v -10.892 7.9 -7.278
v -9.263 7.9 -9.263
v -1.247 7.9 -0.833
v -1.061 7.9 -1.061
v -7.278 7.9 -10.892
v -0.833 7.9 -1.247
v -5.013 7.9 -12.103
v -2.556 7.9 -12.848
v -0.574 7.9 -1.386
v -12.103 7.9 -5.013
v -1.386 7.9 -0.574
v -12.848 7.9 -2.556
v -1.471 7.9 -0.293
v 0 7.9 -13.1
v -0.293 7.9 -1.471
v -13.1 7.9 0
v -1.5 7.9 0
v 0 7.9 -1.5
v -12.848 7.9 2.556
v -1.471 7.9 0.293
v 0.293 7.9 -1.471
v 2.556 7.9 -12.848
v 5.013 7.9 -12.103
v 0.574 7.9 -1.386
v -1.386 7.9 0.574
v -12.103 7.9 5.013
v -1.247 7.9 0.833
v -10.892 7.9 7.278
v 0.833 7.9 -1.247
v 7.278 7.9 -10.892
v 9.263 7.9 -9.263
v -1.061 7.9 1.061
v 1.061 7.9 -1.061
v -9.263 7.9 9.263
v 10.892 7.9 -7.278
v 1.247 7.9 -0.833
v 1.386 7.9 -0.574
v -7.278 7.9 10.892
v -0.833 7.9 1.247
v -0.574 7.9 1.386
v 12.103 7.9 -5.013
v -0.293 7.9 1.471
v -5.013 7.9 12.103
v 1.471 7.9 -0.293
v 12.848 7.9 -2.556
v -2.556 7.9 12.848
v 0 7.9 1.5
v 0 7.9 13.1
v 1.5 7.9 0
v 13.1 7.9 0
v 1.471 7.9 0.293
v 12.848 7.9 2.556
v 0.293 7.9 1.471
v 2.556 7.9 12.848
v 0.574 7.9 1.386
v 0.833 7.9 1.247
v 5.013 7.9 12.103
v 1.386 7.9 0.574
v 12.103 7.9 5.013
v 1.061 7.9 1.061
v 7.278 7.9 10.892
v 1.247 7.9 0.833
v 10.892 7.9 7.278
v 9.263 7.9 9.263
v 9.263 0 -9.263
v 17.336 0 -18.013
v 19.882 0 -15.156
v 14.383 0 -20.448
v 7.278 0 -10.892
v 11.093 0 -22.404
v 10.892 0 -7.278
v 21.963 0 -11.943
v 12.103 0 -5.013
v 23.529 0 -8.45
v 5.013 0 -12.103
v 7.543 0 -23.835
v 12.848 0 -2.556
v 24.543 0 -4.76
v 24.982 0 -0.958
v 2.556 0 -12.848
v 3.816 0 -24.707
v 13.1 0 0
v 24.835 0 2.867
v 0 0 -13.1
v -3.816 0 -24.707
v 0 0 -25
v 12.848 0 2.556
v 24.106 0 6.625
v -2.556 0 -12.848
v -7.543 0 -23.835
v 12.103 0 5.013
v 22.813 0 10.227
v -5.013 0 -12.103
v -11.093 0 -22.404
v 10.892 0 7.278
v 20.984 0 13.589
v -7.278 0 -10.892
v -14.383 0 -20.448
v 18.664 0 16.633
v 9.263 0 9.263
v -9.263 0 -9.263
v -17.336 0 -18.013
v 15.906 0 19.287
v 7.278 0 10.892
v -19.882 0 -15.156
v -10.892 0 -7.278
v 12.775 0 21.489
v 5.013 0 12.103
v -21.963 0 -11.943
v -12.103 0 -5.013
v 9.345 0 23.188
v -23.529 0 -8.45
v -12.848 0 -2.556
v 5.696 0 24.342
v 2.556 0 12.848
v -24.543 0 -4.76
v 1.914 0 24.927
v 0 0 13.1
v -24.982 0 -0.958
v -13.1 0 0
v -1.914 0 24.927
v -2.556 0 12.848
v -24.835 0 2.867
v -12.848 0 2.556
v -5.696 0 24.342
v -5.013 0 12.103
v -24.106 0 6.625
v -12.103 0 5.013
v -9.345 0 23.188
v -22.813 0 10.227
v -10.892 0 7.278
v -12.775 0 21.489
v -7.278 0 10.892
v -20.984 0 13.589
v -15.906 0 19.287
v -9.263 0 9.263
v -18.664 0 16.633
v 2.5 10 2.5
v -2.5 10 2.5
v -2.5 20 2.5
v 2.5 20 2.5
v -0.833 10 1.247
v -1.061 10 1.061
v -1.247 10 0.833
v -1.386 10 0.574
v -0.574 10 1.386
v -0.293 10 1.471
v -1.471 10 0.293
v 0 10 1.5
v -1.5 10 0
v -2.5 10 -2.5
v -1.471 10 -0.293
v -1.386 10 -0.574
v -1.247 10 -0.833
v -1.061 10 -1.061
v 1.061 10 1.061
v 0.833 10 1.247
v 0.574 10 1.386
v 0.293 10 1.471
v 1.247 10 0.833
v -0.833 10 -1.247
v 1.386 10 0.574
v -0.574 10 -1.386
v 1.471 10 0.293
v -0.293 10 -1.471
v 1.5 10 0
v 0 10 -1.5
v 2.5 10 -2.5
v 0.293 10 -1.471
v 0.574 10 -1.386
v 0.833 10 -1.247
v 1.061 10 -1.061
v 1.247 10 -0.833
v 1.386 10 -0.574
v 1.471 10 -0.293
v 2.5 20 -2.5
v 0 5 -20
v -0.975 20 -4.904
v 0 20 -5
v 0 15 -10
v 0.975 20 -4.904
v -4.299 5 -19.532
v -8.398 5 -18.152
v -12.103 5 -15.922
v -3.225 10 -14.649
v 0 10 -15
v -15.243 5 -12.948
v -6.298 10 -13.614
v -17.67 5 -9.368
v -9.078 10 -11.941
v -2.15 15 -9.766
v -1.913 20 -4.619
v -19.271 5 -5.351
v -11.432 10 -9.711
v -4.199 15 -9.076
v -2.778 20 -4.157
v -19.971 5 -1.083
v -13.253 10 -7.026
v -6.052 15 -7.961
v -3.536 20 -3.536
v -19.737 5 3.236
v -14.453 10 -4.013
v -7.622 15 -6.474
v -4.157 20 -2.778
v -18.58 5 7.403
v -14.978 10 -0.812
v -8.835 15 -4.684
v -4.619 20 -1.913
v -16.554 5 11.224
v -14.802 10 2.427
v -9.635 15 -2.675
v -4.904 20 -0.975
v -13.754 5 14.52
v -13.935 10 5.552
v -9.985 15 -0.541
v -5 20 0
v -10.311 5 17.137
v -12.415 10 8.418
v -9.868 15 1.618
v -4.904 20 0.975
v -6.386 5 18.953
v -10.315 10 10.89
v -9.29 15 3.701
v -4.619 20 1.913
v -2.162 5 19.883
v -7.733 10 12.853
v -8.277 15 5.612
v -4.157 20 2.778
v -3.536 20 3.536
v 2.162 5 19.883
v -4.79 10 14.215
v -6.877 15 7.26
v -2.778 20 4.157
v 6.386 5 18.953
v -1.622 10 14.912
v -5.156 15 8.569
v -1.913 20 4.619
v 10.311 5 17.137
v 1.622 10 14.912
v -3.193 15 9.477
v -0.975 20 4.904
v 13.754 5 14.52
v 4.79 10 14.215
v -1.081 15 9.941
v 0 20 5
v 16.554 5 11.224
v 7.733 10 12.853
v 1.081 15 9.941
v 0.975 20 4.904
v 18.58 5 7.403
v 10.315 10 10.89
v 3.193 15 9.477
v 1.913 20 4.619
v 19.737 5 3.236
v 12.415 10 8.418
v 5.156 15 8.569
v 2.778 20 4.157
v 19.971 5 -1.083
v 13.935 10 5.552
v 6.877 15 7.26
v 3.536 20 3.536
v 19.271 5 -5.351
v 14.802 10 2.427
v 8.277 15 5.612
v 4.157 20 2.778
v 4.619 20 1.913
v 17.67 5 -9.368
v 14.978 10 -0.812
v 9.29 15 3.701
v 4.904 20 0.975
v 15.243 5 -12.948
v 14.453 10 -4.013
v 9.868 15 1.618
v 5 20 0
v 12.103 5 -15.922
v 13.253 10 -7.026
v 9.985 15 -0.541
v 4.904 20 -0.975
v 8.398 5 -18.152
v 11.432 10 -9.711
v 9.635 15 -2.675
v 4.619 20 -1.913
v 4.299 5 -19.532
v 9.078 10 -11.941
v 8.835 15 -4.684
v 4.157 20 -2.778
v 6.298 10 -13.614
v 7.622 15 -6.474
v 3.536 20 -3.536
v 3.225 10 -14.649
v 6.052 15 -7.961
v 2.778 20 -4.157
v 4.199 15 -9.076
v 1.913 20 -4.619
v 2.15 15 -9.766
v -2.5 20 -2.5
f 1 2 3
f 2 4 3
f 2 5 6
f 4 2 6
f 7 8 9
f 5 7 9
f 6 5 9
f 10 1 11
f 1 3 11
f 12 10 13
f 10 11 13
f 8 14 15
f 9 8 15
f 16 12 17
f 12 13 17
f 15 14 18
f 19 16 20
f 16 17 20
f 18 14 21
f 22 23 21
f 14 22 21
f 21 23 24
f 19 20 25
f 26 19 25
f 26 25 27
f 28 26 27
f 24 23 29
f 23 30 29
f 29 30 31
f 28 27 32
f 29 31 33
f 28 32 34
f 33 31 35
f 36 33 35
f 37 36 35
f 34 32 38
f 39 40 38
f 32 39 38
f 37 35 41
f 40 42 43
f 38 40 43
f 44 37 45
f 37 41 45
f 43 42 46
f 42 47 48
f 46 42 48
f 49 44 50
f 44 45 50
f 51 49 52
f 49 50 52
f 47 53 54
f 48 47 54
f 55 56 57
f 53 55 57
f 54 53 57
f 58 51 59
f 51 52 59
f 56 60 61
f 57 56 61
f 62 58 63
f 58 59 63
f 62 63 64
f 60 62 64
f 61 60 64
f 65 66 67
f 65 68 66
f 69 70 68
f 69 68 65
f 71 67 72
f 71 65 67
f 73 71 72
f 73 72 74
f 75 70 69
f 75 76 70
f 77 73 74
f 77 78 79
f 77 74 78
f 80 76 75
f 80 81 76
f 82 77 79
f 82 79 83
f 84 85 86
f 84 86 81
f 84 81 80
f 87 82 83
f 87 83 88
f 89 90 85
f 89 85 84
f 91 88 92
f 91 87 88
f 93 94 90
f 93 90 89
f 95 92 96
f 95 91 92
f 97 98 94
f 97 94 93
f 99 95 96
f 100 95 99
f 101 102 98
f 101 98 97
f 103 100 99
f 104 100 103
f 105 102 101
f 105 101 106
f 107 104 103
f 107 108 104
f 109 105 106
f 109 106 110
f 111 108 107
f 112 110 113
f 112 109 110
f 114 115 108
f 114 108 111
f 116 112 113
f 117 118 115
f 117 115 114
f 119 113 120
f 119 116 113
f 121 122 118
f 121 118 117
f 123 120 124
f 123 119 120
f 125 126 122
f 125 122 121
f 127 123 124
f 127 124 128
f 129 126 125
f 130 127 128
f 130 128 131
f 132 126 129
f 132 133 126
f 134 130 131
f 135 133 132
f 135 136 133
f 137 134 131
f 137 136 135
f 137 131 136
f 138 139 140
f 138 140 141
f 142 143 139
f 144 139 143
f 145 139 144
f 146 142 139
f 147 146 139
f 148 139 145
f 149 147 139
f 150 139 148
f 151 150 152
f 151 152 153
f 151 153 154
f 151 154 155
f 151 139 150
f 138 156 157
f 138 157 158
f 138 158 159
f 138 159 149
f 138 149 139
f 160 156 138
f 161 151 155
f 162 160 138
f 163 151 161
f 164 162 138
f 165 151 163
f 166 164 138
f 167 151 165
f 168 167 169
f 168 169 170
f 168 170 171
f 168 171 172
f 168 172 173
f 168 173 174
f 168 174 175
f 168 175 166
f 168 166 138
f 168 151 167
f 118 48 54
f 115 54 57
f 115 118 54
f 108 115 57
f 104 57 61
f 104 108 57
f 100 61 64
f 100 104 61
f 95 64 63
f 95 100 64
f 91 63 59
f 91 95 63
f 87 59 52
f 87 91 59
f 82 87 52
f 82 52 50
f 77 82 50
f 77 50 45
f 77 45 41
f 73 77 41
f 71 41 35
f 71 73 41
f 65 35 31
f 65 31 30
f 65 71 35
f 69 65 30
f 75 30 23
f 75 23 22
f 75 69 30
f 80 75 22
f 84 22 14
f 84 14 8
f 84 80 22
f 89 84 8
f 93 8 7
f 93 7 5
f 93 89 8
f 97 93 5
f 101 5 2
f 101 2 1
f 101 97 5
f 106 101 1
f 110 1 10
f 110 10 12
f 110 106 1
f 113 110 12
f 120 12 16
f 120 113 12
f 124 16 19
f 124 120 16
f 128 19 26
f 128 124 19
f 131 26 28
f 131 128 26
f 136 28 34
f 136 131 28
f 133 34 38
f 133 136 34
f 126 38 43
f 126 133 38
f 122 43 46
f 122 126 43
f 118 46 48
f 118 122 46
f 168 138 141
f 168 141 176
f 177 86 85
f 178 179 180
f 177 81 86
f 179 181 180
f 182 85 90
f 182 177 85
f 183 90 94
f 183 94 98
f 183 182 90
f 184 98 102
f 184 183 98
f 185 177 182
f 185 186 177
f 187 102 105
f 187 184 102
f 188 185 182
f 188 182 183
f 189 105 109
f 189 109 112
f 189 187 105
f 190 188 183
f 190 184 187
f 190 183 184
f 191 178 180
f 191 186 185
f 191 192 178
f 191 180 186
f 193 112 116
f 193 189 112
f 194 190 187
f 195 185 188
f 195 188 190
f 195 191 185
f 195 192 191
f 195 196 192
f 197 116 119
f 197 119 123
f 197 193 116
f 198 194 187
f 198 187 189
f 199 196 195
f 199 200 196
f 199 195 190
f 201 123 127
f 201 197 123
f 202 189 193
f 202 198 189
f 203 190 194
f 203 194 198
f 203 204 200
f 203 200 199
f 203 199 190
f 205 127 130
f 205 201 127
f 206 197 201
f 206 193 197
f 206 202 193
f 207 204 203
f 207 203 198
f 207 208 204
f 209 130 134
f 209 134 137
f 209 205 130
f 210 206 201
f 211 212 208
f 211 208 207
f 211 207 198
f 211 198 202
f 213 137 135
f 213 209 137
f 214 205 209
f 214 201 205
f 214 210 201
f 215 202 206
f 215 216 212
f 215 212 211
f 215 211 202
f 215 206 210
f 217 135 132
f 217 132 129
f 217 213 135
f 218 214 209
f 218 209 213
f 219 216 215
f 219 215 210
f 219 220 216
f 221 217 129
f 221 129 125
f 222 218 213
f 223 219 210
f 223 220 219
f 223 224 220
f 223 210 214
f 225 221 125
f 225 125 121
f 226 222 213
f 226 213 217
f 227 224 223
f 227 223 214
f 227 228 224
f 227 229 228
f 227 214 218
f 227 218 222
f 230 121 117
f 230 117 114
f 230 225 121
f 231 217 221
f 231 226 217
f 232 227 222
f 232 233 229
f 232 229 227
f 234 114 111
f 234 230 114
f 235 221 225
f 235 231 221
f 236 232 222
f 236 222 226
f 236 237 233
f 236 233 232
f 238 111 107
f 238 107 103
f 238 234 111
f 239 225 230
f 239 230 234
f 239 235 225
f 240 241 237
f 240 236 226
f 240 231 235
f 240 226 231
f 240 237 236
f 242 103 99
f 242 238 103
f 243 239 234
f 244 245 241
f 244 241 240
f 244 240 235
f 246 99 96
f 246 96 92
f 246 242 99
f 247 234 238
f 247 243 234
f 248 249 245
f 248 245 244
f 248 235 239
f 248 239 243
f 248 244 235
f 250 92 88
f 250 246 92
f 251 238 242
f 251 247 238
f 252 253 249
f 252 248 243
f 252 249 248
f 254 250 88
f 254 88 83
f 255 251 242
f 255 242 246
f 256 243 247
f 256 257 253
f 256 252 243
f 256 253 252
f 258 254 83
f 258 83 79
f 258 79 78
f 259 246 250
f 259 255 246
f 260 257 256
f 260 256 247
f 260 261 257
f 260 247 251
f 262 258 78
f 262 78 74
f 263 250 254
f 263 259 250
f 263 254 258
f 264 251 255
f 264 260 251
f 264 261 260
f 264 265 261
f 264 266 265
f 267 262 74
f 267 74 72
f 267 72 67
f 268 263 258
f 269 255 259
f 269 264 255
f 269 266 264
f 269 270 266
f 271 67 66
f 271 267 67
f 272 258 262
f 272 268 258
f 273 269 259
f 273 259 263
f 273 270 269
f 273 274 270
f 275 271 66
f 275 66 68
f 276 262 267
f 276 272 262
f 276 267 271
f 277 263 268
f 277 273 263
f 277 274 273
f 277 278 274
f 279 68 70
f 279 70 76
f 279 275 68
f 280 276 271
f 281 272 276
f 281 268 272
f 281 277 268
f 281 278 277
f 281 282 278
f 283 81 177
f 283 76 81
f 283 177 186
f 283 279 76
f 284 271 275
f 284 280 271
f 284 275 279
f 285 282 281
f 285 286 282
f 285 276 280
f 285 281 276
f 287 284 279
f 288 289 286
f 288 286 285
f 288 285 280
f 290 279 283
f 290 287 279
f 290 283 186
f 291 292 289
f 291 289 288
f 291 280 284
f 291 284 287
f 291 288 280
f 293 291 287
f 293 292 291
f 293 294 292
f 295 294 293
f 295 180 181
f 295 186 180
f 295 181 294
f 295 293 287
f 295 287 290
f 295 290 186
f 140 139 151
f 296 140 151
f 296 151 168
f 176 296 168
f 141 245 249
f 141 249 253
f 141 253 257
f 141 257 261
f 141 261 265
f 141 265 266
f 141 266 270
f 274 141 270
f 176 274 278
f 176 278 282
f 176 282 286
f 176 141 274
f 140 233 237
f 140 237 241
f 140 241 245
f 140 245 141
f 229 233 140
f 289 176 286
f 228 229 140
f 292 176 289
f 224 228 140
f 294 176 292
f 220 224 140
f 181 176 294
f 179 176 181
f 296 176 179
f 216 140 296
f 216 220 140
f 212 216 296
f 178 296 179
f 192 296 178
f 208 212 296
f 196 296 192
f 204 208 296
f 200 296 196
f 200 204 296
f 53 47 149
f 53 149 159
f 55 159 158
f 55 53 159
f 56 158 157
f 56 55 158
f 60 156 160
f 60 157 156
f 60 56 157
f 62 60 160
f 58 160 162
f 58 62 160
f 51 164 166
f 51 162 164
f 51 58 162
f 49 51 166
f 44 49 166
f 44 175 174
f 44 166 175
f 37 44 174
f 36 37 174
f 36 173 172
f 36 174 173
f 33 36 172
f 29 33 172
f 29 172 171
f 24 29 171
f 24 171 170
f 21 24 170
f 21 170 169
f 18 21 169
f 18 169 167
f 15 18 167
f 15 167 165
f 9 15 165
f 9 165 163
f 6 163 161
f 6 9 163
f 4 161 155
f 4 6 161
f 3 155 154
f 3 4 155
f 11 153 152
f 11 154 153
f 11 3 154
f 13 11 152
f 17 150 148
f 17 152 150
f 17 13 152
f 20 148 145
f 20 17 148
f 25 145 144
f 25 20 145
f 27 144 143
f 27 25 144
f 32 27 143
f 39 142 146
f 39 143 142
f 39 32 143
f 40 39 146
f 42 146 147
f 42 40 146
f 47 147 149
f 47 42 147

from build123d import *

# Parameters (mm, degrees)
SKETCH2_R          = 1.5
CUT_EXTRUDE1_DEPTH = 41.620192023
CUT_EXTRUDE2_START = 10
SKETCH3_W          = 5
SKETCH3_H          = 5
CUT_EXTRUDE2_DEPTH = 31.620192023
SKETCH4_R          = 13.1
CUT_EXTRUDE3_DEPTH = 7.9


with BuildPart() as part:
    # Sketch1 → Revolve1 (revolve)
    with BuildSketch(Plane(origin=(0, 0, 0), x_dir=(0, 0, -1), z_dir=(1, 0, 0))):
        Polygon((0, 0), (25, 0), (5, 20), (0, 20), align=None)
    revolve(axis=Axis((0, 0, 0), (0, 1, 0)))

    # Sketch2 → Cut-Extrude1 (cut, through all)
    with BuildSketch(Plane(origin=(0, 0, 0), x_dir=(1, 0, 0), z_dir=(0, 1, 0))):
        with Locations(Location((0, 0, 0), (0, 0, 270))):
            Circle(SKETCH2_R)
    extrude(amount=CUT_EXTRUDE1_DEPTH, mode=Mode.SUBTRACT)

    # Sketch3 → Cut-Extrude2 (cut, through all)
    with BuildSketch(Plane(origin=(0, 0, 0), x_dir=(1, 0, 0), z_dir=(0, 1, 0)).offset(CUT_EXTRUDE2_START)):
        Rectangle(SKETCH3_W, SKETCH3_H)
    extrude(amount=CUT_EXTRUDE2_DEPTH, mode=Mode.SUBTRACT)

    # Sketch4 → Cut-Extrude3 (cut)
    with BuildSketch(Plane(origin=(0, 0, 0), x_dir=(1, 0, 0), z_dir=(0, 1, 0))):
        with Locations(Location((0, 0, 0), (0, 0, 270))):
            Circle(SKETCH4_R)
    extrude(amount=CUT_EXTRUDE3_DEPTH, mode=Mode.SUBTRACT)


solid = part.part
